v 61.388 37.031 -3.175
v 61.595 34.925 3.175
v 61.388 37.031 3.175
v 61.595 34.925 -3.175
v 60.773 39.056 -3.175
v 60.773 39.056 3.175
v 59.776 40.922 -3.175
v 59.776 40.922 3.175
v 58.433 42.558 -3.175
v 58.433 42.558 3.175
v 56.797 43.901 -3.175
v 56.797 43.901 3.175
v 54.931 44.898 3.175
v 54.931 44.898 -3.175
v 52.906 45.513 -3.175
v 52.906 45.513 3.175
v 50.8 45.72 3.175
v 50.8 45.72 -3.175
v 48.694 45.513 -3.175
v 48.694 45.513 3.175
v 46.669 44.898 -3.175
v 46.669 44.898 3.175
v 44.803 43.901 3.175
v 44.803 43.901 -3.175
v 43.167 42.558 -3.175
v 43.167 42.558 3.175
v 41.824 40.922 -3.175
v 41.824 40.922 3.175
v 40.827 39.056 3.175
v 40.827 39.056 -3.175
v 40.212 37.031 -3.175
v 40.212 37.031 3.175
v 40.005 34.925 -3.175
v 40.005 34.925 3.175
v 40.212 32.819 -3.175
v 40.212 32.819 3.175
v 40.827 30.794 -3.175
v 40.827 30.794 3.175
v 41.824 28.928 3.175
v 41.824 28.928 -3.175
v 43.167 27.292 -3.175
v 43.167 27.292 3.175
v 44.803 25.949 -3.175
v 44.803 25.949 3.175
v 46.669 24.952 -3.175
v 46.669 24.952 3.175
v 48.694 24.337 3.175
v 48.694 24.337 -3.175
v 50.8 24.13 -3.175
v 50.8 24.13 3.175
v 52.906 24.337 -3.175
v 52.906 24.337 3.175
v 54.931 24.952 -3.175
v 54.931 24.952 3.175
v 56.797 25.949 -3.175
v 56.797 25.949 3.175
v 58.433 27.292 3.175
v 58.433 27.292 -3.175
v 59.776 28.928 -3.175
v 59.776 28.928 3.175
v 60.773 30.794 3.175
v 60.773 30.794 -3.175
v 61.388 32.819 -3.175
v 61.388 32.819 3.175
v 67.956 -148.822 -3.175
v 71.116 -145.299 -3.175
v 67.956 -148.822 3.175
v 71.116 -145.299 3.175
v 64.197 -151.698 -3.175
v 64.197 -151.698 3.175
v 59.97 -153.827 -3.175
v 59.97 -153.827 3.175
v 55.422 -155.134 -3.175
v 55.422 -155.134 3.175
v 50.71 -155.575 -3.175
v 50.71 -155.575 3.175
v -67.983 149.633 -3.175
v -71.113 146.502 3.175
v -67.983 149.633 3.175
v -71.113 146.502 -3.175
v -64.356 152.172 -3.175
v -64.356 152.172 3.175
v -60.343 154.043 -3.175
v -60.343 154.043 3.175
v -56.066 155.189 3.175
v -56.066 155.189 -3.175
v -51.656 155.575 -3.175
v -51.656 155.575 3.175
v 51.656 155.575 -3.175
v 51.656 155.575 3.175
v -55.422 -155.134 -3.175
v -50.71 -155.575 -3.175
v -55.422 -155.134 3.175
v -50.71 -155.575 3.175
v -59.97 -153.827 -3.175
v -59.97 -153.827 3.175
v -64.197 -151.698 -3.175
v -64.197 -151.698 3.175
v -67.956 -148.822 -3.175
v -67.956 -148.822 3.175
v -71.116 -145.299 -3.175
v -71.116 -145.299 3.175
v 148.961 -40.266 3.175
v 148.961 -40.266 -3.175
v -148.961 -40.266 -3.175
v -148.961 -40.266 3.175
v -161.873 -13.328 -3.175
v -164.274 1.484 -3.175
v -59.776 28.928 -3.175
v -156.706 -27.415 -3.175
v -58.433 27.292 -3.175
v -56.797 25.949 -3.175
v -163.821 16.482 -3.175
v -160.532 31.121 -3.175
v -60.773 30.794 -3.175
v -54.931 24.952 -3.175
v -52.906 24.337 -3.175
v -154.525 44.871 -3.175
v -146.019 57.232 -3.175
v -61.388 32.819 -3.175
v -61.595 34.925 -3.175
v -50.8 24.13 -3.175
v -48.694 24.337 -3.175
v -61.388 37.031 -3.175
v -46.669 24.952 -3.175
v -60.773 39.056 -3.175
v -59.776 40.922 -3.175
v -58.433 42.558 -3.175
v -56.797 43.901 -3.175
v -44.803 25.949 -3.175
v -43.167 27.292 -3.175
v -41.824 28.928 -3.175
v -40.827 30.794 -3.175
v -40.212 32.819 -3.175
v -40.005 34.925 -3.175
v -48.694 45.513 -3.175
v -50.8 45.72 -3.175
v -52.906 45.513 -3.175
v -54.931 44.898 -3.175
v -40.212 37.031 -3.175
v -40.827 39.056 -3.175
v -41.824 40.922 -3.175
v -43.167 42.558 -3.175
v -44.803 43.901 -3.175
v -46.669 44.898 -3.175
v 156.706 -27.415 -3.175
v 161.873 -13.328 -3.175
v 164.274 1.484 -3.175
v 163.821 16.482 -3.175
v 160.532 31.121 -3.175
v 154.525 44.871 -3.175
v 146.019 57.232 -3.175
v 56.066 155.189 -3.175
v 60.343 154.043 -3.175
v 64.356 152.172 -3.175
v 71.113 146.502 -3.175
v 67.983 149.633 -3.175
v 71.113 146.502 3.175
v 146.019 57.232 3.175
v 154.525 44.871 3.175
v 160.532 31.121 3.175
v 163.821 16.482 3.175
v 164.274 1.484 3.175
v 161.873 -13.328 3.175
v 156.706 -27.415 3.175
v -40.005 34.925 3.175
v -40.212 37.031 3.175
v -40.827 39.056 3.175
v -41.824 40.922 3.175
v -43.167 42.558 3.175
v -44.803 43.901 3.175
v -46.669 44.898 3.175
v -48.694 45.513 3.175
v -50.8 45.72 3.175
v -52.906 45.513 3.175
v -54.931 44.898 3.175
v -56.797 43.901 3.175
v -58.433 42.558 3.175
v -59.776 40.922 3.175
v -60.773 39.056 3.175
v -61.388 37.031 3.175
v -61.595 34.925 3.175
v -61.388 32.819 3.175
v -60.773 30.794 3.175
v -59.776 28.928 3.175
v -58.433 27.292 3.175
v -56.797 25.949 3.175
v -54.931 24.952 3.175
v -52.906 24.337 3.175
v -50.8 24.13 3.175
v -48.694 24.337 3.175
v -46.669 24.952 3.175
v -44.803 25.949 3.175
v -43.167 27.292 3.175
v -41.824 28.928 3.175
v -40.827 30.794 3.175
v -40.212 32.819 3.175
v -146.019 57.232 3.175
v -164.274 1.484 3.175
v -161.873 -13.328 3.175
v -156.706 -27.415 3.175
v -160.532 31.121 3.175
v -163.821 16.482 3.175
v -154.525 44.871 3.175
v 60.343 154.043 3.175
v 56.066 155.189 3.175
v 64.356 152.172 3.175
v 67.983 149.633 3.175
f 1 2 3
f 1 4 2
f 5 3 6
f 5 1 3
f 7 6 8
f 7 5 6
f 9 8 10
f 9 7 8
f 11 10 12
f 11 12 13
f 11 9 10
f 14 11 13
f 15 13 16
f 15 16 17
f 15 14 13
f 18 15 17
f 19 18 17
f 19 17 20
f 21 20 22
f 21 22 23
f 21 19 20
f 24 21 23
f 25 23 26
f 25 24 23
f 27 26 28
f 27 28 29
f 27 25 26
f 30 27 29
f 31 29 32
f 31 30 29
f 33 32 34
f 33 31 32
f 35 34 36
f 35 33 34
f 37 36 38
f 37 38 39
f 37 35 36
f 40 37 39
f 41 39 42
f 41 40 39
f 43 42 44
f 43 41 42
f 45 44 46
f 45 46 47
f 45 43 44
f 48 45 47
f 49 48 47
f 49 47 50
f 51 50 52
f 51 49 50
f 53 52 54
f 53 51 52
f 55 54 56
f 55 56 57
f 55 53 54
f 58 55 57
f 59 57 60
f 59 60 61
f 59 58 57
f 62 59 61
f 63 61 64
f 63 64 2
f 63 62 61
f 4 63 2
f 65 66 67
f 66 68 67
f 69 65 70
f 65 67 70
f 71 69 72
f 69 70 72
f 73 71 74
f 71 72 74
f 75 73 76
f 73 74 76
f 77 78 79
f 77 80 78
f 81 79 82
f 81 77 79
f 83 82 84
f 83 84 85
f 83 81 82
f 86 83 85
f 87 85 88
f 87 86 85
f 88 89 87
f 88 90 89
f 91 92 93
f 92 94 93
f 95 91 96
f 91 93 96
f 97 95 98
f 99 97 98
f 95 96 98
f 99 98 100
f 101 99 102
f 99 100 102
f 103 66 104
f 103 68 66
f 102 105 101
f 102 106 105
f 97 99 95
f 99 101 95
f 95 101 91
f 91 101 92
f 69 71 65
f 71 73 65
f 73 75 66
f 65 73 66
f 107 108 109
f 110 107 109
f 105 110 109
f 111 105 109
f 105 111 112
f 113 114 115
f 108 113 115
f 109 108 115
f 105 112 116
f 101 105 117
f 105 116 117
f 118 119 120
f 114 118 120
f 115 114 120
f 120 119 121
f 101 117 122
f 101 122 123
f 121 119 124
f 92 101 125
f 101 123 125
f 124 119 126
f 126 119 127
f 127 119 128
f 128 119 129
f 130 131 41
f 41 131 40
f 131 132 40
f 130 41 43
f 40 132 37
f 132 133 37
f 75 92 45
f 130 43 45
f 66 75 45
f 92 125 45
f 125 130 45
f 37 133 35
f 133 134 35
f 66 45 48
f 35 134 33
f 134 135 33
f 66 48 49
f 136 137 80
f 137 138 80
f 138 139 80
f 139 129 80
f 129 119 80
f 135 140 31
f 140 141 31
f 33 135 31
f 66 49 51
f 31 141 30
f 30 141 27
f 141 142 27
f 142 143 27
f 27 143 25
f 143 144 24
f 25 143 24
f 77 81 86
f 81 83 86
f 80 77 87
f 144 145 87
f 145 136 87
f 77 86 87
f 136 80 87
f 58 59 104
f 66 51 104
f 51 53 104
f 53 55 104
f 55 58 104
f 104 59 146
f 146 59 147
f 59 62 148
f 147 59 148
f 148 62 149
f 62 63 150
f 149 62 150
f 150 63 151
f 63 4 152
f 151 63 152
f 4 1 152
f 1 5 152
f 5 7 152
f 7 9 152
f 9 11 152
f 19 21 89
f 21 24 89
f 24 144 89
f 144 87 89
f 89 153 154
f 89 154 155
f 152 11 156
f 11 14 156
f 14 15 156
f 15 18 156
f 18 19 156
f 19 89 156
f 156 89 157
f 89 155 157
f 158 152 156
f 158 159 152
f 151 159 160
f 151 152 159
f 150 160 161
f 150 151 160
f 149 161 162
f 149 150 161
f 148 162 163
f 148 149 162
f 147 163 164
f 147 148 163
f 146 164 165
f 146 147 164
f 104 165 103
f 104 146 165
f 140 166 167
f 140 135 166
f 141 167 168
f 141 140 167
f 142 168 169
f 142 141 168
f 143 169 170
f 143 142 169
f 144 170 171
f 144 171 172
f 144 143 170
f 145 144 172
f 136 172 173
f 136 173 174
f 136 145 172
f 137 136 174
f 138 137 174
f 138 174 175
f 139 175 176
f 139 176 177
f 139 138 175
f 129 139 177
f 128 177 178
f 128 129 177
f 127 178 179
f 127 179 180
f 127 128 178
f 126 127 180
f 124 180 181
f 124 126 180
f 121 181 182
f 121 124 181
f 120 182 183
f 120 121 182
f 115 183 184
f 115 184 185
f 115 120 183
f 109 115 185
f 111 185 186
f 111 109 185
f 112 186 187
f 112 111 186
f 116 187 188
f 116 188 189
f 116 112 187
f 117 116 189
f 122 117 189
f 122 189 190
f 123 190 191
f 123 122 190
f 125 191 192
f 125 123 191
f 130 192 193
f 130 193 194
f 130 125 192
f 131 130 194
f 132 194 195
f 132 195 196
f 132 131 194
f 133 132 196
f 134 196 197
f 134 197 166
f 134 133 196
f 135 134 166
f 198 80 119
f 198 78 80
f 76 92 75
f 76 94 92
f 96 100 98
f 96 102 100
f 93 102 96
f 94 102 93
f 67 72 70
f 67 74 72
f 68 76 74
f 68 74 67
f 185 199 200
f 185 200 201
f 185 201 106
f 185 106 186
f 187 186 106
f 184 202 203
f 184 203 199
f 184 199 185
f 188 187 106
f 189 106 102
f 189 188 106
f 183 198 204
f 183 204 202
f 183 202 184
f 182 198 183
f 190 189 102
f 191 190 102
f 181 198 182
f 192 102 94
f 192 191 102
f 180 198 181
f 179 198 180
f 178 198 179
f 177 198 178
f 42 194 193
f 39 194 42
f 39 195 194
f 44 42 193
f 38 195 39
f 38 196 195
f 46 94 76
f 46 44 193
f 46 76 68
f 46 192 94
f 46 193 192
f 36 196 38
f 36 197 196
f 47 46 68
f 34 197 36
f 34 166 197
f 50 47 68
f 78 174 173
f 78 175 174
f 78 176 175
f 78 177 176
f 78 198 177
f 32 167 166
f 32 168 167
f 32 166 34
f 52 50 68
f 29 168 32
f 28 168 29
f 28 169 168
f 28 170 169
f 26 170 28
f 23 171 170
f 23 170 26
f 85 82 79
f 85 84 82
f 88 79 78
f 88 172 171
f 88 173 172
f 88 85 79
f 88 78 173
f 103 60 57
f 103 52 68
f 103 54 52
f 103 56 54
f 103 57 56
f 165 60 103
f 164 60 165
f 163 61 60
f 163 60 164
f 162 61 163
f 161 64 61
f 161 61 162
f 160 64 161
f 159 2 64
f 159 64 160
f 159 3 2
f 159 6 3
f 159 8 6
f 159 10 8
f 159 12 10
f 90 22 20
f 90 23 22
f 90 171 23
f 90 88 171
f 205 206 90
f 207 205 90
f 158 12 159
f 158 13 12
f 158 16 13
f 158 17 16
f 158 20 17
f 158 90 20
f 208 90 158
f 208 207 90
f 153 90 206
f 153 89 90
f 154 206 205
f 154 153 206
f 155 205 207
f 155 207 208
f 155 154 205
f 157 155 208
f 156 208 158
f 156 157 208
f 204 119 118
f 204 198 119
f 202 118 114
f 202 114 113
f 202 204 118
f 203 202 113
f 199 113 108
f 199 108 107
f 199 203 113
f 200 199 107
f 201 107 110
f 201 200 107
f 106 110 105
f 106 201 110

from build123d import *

# Parameters (mm, degrees)
SKETCH1_R           = 10.795
BOSS_EXTRUDE1_DEPTH = 3.175
FILLET1_R           = 25.4
FILLET2_R           = 78.74


with BuildPart() as part:
    # Sketch1 → Boss-Extrude1 (new, symmetric)
    with BuildSketch(Plane.XY):
        Polygon((-63.5, 155.575), (-185.951039645, 9.643533586), (-63.5, -155.575), (63.5, -155.575), (185.951039645, 9.643533586), (63.5, 155.575), align=None)
        with Locations((-50.8, 34.925)):
            Circle(SKETCH1_R, mode=Mode.SUBTRACT)
        with Locations((50.8, 34.925)):
            Circle(SKETCH1_R, mode=Mode.SUBTRACT)
    extrude(amount=BOSS_EXTRUDE1_DEPTH, both=True)

    # Fillet1
    fillet1_edges = [part.edges().sort_by_distance(p)[0] for p in [
        (63.5, 155.575, 0),
        (63.5, -155.575, 0),
        (-63.5, -155.575, 0),
        (-63.5, 155.575, 0),
    ]]
    fillet(fillet1_edges, radius=FILLET1_R)

    # Fillet2
    fillet2_edges = [part.edges().sort_by_distance(p)[0] for p in [
        (185.951039645, 9.643533586, 0),
        (-185.951039645, 9.643533586, 0),
    ]]
    fillet(fillet2_edges, radius=FILLET2_R)


solid = part.part
